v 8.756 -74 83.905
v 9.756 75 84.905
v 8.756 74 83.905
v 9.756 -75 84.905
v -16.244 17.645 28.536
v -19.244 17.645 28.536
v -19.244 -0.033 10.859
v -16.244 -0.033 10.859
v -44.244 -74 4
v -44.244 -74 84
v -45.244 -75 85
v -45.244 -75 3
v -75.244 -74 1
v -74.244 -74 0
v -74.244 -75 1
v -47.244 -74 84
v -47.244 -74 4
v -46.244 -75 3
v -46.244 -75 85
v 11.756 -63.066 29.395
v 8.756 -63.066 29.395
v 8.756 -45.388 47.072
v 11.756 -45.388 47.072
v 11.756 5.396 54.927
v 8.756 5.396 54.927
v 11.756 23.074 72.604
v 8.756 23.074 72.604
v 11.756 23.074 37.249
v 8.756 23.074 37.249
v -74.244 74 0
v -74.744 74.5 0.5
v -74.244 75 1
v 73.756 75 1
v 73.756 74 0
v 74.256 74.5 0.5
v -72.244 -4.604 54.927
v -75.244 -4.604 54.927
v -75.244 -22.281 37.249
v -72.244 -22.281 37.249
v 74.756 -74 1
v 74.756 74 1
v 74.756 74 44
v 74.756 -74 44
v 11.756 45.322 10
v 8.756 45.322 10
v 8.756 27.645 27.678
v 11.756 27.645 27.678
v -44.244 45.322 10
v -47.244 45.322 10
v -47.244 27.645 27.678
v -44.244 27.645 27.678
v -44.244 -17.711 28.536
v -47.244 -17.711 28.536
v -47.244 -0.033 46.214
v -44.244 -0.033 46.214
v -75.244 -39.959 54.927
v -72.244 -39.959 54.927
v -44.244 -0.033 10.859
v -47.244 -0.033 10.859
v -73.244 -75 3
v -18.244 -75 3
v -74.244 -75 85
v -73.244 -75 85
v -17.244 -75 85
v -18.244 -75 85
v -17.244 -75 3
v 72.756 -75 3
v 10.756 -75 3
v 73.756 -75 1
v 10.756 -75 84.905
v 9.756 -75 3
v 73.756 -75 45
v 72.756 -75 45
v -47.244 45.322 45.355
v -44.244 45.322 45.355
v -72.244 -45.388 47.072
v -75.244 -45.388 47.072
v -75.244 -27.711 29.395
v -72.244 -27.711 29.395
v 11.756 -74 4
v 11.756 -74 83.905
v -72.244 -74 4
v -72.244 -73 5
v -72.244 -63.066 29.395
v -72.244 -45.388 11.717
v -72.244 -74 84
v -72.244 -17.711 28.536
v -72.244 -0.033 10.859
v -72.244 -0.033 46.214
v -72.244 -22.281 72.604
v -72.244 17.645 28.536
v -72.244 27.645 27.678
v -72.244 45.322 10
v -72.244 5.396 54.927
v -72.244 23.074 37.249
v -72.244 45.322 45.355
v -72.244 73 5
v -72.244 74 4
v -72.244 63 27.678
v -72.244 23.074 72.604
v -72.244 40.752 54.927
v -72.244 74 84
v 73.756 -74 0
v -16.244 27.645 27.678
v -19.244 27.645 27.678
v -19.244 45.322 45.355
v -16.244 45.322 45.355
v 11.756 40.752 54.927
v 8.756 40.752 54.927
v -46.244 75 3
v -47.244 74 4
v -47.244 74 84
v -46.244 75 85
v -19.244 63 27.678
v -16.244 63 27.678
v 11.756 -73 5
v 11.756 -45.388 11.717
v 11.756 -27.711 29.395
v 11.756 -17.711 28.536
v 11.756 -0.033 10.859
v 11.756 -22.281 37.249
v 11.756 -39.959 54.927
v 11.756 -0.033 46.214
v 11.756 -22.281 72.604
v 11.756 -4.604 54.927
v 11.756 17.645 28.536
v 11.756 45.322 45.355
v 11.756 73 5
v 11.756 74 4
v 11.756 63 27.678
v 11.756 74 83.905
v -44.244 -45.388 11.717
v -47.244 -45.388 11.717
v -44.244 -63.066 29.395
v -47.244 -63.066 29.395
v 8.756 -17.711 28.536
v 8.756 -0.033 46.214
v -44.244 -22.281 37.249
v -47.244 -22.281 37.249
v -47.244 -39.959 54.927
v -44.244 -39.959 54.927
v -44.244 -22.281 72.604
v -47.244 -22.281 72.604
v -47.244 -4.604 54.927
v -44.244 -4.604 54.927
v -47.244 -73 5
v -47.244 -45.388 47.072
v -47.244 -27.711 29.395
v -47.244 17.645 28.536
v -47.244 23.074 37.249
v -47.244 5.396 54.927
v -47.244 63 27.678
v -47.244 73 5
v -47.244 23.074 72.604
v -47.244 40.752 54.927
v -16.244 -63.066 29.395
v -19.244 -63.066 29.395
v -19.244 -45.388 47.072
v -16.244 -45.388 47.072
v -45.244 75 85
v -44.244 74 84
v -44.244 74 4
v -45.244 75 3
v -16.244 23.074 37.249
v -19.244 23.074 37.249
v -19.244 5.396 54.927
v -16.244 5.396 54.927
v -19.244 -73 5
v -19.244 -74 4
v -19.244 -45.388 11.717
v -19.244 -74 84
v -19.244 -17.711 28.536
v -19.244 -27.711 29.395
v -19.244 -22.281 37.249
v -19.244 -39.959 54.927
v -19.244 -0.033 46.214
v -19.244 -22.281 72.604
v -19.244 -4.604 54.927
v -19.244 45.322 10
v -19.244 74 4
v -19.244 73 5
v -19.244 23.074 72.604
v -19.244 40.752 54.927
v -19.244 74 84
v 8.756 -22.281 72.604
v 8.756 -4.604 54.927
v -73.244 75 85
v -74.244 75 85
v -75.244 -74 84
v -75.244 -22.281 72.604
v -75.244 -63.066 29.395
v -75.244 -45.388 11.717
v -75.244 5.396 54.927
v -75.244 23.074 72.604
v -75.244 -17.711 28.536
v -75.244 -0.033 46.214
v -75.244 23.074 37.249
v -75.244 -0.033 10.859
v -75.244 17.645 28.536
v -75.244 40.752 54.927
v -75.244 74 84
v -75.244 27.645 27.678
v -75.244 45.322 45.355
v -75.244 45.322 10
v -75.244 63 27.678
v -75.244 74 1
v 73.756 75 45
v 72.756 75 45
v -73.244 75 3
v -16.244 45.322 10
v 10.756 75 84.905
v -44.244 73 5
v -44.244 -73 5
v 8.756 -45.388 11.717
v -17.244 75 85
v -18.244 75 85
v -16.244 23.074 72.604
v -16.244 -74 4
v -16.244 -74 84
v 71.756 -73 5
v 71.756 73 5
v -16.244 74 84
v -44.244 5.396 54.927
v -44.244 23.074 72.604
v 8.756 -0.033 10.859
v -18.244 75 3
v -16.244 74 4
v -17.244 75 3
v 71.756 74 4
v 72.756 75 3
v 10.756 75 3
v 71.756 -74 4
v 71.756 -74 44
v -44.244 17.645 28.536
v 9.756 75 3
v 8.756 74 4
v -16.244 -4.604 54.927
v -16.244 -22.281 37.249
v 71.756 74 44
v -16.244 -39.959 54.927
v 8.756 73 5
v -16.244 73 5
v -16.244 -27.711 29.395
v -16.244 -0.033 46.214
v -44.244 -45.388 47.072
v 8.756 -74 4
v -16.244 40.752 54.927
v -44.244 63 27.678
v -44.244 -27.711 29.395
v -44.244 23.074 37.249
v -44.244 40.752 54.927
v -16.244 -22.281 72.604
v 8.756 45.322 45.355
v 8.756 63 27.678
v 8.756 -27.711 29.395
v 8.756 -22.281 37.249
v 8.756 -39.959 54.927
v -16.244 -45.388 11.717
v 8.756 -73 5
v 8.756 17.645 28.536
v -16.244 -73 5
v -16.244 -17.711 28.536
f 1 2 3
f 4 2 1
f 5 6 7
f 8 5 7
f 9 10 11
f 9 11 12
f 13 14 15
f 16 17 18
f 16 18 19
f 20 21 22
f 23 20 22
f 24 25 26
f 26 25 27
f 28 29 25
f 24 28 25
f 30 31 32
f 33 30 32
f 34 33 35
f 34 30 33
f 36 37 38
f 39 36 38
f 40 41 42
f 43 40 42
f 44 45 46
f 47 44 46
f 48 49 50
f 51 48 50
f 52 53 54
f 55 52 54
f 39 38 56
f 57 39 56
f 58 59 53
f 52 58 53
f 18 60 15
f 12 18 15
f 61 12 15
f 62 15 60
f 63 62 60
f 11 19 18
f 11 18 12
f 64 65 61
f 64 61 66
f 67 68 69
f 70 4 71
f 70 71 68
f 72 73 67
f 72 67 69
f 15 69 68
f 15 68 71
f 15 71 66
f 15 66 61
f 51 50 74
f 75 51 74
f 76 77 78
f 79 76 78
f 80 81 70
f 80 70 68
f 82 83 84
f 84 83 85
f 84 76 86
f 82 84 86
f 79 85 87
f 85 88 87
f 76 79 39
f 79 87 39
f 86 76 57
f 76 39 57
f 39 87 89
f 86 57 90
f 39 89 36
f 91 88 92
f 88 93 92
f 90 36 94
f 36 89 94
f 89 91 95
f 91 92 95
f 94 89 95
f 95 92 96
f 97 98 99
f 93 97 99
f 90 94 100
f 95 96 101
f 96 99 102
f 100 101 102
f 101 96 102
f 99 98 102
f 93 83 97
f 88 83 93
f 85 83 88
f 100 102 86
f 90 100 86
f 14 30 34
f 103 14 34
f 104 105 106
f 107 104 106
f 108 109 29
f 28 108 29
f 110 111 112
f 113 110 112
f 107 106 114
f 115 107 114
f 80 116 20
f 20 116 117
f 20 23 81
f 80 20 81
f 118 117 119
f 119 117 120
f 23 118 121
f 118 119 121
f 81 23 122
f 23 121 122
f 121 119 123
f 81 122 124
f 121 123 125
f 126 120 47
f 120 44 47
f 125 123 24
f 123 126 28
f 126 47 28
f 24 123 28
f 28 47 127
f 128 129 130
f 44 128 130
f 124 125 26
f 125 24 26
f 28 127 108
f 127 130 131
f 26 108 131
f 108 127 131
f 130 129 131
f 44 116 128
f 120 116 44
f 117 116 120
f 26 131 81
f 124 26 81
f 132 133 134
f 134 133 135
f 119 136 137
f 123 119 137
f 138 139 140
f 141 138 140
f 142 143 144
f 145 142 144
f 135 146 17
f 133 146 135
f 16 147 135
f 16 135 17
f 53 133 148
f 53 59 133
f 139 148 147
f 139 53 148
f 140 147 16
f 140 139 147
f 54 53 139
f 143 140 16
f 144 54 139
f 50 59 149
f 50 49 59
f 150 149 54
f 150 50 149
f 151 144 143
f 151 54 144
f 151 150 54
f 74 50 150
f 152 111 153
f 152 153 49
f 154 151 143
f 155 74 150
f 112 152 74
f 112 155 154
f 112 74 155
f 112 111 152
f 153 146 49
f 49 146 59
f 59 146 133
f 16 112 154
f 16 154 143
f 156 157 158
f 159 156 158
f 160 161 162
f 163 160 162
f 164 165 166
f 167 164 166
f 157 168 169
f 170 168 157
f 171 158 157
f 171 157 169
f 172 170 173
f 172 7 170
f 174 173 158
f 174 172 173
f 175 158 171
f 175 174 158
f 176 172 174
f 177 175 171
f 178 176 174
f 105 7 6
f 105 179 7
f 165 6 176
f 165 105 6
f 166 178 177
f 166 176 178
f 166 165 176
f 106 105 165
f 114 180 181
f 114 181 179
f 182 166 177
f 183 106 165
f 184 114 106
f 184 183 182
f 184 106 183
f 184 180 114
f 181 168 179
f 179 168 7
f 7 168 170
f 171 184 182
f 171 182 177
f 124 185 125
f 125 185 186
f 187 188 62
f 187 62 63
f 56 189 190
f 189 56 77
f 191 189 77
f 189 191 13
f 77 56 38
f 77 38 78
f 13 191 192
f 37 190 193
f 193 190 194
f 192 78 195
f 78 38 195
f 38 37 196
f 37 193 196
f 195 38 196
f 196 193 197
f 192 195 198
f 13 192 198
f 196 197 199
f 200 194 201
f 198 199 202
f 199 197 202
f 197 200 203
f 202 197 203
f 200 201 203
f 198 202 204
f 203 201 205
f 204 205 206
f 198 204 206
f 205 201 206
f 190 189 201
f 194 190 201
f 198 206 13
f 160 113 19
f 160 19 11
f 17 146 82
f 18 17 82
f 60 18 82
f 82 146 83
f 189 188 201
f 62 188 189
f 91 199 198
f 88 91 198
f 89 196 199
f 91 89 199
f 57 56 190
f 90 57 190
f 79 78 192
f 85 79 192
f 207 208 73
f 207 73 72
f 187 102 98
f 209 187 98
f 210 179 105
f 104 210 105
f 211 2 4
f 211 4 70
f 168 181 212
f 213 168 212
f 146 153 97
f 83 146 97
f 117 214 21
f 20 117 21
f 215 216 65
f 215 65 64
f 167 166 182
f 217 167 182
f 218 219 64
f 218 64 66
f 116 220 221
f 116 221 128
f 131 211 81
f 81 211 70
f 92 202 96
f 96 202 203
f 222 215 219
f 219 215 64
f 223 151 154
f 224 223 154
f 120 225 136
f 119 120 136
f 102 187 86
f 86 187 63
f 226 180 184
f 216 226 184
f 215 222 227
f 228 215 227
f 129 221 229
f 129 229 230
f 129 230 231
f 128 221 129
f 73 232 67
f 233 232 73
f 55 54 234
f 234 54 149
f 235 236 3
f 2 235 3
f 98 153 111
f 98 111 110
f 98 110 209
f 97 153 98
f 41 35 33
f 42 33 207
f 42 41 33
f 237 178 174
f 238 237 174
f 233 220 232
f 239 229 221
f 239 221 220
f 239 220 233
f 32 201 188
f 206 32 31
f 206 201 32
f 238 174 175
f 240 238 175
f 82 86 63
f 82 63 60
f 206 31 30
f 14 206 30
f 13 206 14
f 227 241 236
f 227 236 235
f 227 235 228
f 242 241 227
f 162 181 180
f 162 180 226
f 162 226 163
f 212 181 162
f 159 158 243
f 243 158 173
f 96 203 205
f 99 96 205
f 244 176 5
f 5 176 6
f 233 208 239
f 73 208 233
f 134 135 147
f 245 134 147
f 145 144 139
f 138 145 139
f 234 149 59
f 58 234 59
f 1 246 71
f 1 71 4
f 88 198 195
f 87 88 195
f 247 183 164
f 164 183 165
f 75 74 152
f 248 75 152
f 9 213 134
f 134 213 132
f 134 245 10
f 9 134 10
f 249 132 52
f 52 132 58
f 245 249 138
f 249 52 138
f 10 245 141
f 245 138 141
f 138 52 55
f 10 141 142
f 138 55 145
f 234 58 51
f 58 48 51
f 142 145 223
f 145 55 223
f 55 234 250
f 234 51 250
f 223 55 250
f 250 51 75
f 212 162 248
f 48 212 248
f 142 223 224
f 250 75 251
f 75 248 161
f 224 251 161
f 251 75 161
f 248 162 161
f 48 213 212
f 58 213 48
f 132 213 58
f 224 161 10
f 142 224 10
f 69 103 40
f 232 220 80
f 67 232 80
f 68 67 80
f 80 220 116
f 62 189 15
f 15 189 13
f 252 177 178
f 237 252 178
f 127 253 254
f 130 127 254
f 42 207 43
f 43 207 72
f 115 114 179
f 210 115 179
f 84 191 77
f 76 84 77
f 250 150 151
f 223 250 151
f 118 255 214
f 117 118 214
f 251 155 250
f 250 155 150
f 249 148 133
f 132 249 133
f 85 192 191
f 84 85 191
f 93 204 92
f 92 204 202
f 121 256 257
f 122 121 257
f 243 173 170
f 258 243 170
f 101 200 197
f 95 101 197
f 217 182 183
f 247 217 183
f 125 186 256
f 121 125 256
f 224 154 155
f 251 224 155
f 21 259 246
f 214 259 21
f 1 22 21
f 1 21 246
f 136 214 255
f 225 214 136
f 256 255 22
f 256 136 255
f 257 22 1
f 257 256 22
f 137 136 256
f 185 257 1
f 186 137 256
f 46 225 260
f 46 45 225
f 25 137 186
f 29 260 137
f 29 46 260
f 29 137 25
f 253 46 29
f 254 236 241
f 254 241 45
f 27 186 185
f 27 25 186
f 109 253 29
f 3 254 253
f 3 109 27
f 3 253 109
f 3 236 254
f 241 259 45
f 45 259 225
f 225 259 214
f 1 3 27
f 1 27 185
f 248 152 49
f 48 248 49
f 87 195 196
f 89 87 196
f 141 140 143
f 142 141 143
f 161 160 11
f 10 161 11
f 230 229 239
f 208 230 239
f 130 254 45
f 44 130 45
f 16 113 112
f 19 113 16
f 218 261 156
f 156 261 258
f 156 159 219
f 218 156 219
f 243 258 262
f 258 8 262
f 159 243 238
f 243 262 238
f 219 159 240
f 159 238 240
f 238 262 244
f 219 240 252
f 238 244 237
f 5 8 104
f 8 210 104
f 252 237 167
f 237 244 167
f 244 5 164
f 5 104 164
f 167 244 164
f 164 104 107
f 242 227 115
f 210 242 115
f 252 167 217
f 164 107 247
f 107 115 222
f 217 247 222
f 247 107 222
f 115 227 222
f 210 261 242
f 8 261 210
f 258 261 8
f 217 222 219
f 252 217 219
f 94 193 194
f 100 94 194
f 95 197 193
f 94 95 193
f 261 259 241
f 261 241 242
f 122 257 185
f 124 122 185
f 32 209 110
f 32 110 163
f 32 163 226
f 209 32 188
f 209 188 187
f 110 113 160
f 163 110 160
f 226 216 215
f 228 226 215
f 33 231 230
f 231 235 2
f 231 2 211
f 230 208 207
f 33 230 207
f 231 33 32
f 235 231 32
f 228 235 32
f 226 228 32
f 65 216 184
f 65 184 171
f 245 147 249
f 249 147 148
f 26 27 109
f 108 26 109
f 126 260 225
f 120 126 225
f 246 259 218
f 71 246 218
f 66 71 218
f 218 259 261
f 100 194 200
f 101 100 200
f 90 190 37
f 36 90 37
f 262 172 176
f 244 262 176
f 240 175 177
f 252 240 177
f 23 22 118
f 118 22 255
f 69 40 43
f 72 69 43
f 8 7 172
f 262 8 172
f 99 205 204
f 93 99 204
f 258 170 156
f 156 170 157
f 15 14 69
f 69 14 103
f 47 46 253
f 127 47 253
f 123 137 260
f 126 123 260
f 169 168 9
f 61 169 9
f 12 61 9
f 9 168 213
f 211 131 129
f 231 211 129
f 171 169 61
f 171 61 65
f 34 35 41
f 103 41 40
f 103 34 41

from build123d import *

# Parameters (mm, degrees)
F0_W     = 3
F0_H     = 80
F0_H_2   = 40
F0_H_3   = 79.9047601223
F1_DEPTH = 150
F3_DEPTH = 120
F4_SIZE  = 2
F5_SIZE  = 1
F6_SIZE  = 1
F7_SIZE  = 1


with BuildPart() as f1:
    # F0 (on Front) → F1 (new body)
    with BuildSketch(Plane.XZ):
        with Locations((-61.7444703951, 45)):
            Rectangle(F0_W, F0_H)
        Polygon((-60.2444703951, 5), (-63.2444703951, 5), (-63.2444703951, 0), (86.7555296049, 0), (86.7555296049, 5), (83.7555296049, 5), (23.7555296049, 5), (20.7555296049, 5), (-4.2444703951, 5), (-7.2444703951, 5), (-32.2444703951, 5), (-35.2444703951, 5), align=None)
        with Locations((-33.7444703951, 45)):
            Rectangle(F0_W, F0_H)
        with Locations((85.2555296049, 25)):
            Rectangle(F0_W, F0_H_2)
        with Locations((-5.7444703951, 45)):
            Rectangle(F0_W, F0_H)
        with Locations((22.2555296049, 44.9523800611)):
            Rectangle(F0_W, F0_H_3)
    extrude(amount=F1_DEPTH)

    # F2 (on face) → F3 (cut)
    with BuildSketch(Plane(origin=(-63.2444703951, 0, 0), x_dir=(0, -1, 0), z_dir=(-1, 0, 0))):
        Polygon((47.3553390593, 27.6776695297), (29.6776695297, 45.3553390593), (12, 27.6776695297), (29.6776695297, 10), align=None)
        Polygon((92.7106781187, 28.5361891277), (75.033008589, 46.2138586573), (57.3553390593, 28.5361891277), (75.033008589, 10.858519598), align=None)
        Polygon((138.066017178, 29.3947087257), (120.3883476483, 47.0723782553), (102.7106781187, 29.3947087257), (120.3883476483, 11.717039196), align=None)
        Polygon((69.60374879, 54.9267344821), (51.9260792603, 72.6044040117), (34.2484097307, 54.9267344821), (51.9260792603, 37.2490649524), align=None)
        Polygon((114.9590878493, 54.9267344821), (97.2814183197, 72.6044040117), (79.60374879, 54.9267344821), (97.2814183197, 37.2490649524), align=None)
    extrude(amount=-F3_DEPTH, mode=Mode.SUBTRACT)

    # F4
    f4_edges = [f1.edges().sort_by_distance(p)[0] for p in [
        (53.75553, -150, 5),
        (8.25553, -150, 5),
        (-19.74447, -150, 5),
        (-47.74447, -150, 5),
        (-47.74447, 0, 5),
        (-19.74447, 0, 5),
        (8.25553, 0, 5),
        (53.75553, 0, 5),
    ]]
    chamfer(f4_edges, length=F4_SIZE)

    # F5
    f5_edges = [f1.edges().sort_by_distance(p)[0] for p in [
        (-63.24447, -75, 0),
        (11.75553, -150, 0),
        (86.75553, -75, 0),
        (11.75553, 0, 0),
        (83.75553, -150, 25),
        (20.75553, -150, 44.95238),
        (-7.24447, -150, 45),
        (-35.24447, -150, 45),
        (-63.24447, -150, 42.5),
        (86.75553, -150, 22.5),
        (23.75553, -150, 44.95238),
        (-4.24447, -150, 45),
        (-32.24447, -150, 45),
        (-60.24447, -150, 45),
    ]]
    chamfer(f5_edges, length=F5_SIZE)

    # F6
    f6_edges = [f1.edges().sort_by_distance(p)[0] for p in [
        (83.75553, 0, 25),
        (86.75553, 0, 23),
        (23.75553, 0, 44.95238),
        (20.75553, 0, 44.95238),
        (-4.24447, 0, 45),
        (-7.24447, 0, 45),
        (-32.24447, 0, 45),
        (-35.24447, 0, 45),
        (-60.24447, 0, 45),
        (-63.24447, 0, 43),
    ]]
    chamfer(f6_edges, length=F6_SIZE)

    # F7
    f7_edges = [f1.edges().sort_by_distance(p)[0] for p in [
        (86.75553, -75, 45),
        (83.75553, -75, 45),
        (23.75553, -75, 84.90476),
        (20.75553, -75, 84.90476),
        (-4.24447, -75, 85),
        (-7.24447, -75, 85),
        (-32.24447, -75, 85),
        (-35.24447, -75, 85),
        (-60.24447, -75, 85),
        (-63.24447, -75, 85),
    ]]
    chamfer(f7_edges, length=F7_SIZE)


with BuildPart() as f1_1:
    # F8: moved
    add(f1.part.moved(Location((-12, 75, 0))))


solid = f1_1.part
